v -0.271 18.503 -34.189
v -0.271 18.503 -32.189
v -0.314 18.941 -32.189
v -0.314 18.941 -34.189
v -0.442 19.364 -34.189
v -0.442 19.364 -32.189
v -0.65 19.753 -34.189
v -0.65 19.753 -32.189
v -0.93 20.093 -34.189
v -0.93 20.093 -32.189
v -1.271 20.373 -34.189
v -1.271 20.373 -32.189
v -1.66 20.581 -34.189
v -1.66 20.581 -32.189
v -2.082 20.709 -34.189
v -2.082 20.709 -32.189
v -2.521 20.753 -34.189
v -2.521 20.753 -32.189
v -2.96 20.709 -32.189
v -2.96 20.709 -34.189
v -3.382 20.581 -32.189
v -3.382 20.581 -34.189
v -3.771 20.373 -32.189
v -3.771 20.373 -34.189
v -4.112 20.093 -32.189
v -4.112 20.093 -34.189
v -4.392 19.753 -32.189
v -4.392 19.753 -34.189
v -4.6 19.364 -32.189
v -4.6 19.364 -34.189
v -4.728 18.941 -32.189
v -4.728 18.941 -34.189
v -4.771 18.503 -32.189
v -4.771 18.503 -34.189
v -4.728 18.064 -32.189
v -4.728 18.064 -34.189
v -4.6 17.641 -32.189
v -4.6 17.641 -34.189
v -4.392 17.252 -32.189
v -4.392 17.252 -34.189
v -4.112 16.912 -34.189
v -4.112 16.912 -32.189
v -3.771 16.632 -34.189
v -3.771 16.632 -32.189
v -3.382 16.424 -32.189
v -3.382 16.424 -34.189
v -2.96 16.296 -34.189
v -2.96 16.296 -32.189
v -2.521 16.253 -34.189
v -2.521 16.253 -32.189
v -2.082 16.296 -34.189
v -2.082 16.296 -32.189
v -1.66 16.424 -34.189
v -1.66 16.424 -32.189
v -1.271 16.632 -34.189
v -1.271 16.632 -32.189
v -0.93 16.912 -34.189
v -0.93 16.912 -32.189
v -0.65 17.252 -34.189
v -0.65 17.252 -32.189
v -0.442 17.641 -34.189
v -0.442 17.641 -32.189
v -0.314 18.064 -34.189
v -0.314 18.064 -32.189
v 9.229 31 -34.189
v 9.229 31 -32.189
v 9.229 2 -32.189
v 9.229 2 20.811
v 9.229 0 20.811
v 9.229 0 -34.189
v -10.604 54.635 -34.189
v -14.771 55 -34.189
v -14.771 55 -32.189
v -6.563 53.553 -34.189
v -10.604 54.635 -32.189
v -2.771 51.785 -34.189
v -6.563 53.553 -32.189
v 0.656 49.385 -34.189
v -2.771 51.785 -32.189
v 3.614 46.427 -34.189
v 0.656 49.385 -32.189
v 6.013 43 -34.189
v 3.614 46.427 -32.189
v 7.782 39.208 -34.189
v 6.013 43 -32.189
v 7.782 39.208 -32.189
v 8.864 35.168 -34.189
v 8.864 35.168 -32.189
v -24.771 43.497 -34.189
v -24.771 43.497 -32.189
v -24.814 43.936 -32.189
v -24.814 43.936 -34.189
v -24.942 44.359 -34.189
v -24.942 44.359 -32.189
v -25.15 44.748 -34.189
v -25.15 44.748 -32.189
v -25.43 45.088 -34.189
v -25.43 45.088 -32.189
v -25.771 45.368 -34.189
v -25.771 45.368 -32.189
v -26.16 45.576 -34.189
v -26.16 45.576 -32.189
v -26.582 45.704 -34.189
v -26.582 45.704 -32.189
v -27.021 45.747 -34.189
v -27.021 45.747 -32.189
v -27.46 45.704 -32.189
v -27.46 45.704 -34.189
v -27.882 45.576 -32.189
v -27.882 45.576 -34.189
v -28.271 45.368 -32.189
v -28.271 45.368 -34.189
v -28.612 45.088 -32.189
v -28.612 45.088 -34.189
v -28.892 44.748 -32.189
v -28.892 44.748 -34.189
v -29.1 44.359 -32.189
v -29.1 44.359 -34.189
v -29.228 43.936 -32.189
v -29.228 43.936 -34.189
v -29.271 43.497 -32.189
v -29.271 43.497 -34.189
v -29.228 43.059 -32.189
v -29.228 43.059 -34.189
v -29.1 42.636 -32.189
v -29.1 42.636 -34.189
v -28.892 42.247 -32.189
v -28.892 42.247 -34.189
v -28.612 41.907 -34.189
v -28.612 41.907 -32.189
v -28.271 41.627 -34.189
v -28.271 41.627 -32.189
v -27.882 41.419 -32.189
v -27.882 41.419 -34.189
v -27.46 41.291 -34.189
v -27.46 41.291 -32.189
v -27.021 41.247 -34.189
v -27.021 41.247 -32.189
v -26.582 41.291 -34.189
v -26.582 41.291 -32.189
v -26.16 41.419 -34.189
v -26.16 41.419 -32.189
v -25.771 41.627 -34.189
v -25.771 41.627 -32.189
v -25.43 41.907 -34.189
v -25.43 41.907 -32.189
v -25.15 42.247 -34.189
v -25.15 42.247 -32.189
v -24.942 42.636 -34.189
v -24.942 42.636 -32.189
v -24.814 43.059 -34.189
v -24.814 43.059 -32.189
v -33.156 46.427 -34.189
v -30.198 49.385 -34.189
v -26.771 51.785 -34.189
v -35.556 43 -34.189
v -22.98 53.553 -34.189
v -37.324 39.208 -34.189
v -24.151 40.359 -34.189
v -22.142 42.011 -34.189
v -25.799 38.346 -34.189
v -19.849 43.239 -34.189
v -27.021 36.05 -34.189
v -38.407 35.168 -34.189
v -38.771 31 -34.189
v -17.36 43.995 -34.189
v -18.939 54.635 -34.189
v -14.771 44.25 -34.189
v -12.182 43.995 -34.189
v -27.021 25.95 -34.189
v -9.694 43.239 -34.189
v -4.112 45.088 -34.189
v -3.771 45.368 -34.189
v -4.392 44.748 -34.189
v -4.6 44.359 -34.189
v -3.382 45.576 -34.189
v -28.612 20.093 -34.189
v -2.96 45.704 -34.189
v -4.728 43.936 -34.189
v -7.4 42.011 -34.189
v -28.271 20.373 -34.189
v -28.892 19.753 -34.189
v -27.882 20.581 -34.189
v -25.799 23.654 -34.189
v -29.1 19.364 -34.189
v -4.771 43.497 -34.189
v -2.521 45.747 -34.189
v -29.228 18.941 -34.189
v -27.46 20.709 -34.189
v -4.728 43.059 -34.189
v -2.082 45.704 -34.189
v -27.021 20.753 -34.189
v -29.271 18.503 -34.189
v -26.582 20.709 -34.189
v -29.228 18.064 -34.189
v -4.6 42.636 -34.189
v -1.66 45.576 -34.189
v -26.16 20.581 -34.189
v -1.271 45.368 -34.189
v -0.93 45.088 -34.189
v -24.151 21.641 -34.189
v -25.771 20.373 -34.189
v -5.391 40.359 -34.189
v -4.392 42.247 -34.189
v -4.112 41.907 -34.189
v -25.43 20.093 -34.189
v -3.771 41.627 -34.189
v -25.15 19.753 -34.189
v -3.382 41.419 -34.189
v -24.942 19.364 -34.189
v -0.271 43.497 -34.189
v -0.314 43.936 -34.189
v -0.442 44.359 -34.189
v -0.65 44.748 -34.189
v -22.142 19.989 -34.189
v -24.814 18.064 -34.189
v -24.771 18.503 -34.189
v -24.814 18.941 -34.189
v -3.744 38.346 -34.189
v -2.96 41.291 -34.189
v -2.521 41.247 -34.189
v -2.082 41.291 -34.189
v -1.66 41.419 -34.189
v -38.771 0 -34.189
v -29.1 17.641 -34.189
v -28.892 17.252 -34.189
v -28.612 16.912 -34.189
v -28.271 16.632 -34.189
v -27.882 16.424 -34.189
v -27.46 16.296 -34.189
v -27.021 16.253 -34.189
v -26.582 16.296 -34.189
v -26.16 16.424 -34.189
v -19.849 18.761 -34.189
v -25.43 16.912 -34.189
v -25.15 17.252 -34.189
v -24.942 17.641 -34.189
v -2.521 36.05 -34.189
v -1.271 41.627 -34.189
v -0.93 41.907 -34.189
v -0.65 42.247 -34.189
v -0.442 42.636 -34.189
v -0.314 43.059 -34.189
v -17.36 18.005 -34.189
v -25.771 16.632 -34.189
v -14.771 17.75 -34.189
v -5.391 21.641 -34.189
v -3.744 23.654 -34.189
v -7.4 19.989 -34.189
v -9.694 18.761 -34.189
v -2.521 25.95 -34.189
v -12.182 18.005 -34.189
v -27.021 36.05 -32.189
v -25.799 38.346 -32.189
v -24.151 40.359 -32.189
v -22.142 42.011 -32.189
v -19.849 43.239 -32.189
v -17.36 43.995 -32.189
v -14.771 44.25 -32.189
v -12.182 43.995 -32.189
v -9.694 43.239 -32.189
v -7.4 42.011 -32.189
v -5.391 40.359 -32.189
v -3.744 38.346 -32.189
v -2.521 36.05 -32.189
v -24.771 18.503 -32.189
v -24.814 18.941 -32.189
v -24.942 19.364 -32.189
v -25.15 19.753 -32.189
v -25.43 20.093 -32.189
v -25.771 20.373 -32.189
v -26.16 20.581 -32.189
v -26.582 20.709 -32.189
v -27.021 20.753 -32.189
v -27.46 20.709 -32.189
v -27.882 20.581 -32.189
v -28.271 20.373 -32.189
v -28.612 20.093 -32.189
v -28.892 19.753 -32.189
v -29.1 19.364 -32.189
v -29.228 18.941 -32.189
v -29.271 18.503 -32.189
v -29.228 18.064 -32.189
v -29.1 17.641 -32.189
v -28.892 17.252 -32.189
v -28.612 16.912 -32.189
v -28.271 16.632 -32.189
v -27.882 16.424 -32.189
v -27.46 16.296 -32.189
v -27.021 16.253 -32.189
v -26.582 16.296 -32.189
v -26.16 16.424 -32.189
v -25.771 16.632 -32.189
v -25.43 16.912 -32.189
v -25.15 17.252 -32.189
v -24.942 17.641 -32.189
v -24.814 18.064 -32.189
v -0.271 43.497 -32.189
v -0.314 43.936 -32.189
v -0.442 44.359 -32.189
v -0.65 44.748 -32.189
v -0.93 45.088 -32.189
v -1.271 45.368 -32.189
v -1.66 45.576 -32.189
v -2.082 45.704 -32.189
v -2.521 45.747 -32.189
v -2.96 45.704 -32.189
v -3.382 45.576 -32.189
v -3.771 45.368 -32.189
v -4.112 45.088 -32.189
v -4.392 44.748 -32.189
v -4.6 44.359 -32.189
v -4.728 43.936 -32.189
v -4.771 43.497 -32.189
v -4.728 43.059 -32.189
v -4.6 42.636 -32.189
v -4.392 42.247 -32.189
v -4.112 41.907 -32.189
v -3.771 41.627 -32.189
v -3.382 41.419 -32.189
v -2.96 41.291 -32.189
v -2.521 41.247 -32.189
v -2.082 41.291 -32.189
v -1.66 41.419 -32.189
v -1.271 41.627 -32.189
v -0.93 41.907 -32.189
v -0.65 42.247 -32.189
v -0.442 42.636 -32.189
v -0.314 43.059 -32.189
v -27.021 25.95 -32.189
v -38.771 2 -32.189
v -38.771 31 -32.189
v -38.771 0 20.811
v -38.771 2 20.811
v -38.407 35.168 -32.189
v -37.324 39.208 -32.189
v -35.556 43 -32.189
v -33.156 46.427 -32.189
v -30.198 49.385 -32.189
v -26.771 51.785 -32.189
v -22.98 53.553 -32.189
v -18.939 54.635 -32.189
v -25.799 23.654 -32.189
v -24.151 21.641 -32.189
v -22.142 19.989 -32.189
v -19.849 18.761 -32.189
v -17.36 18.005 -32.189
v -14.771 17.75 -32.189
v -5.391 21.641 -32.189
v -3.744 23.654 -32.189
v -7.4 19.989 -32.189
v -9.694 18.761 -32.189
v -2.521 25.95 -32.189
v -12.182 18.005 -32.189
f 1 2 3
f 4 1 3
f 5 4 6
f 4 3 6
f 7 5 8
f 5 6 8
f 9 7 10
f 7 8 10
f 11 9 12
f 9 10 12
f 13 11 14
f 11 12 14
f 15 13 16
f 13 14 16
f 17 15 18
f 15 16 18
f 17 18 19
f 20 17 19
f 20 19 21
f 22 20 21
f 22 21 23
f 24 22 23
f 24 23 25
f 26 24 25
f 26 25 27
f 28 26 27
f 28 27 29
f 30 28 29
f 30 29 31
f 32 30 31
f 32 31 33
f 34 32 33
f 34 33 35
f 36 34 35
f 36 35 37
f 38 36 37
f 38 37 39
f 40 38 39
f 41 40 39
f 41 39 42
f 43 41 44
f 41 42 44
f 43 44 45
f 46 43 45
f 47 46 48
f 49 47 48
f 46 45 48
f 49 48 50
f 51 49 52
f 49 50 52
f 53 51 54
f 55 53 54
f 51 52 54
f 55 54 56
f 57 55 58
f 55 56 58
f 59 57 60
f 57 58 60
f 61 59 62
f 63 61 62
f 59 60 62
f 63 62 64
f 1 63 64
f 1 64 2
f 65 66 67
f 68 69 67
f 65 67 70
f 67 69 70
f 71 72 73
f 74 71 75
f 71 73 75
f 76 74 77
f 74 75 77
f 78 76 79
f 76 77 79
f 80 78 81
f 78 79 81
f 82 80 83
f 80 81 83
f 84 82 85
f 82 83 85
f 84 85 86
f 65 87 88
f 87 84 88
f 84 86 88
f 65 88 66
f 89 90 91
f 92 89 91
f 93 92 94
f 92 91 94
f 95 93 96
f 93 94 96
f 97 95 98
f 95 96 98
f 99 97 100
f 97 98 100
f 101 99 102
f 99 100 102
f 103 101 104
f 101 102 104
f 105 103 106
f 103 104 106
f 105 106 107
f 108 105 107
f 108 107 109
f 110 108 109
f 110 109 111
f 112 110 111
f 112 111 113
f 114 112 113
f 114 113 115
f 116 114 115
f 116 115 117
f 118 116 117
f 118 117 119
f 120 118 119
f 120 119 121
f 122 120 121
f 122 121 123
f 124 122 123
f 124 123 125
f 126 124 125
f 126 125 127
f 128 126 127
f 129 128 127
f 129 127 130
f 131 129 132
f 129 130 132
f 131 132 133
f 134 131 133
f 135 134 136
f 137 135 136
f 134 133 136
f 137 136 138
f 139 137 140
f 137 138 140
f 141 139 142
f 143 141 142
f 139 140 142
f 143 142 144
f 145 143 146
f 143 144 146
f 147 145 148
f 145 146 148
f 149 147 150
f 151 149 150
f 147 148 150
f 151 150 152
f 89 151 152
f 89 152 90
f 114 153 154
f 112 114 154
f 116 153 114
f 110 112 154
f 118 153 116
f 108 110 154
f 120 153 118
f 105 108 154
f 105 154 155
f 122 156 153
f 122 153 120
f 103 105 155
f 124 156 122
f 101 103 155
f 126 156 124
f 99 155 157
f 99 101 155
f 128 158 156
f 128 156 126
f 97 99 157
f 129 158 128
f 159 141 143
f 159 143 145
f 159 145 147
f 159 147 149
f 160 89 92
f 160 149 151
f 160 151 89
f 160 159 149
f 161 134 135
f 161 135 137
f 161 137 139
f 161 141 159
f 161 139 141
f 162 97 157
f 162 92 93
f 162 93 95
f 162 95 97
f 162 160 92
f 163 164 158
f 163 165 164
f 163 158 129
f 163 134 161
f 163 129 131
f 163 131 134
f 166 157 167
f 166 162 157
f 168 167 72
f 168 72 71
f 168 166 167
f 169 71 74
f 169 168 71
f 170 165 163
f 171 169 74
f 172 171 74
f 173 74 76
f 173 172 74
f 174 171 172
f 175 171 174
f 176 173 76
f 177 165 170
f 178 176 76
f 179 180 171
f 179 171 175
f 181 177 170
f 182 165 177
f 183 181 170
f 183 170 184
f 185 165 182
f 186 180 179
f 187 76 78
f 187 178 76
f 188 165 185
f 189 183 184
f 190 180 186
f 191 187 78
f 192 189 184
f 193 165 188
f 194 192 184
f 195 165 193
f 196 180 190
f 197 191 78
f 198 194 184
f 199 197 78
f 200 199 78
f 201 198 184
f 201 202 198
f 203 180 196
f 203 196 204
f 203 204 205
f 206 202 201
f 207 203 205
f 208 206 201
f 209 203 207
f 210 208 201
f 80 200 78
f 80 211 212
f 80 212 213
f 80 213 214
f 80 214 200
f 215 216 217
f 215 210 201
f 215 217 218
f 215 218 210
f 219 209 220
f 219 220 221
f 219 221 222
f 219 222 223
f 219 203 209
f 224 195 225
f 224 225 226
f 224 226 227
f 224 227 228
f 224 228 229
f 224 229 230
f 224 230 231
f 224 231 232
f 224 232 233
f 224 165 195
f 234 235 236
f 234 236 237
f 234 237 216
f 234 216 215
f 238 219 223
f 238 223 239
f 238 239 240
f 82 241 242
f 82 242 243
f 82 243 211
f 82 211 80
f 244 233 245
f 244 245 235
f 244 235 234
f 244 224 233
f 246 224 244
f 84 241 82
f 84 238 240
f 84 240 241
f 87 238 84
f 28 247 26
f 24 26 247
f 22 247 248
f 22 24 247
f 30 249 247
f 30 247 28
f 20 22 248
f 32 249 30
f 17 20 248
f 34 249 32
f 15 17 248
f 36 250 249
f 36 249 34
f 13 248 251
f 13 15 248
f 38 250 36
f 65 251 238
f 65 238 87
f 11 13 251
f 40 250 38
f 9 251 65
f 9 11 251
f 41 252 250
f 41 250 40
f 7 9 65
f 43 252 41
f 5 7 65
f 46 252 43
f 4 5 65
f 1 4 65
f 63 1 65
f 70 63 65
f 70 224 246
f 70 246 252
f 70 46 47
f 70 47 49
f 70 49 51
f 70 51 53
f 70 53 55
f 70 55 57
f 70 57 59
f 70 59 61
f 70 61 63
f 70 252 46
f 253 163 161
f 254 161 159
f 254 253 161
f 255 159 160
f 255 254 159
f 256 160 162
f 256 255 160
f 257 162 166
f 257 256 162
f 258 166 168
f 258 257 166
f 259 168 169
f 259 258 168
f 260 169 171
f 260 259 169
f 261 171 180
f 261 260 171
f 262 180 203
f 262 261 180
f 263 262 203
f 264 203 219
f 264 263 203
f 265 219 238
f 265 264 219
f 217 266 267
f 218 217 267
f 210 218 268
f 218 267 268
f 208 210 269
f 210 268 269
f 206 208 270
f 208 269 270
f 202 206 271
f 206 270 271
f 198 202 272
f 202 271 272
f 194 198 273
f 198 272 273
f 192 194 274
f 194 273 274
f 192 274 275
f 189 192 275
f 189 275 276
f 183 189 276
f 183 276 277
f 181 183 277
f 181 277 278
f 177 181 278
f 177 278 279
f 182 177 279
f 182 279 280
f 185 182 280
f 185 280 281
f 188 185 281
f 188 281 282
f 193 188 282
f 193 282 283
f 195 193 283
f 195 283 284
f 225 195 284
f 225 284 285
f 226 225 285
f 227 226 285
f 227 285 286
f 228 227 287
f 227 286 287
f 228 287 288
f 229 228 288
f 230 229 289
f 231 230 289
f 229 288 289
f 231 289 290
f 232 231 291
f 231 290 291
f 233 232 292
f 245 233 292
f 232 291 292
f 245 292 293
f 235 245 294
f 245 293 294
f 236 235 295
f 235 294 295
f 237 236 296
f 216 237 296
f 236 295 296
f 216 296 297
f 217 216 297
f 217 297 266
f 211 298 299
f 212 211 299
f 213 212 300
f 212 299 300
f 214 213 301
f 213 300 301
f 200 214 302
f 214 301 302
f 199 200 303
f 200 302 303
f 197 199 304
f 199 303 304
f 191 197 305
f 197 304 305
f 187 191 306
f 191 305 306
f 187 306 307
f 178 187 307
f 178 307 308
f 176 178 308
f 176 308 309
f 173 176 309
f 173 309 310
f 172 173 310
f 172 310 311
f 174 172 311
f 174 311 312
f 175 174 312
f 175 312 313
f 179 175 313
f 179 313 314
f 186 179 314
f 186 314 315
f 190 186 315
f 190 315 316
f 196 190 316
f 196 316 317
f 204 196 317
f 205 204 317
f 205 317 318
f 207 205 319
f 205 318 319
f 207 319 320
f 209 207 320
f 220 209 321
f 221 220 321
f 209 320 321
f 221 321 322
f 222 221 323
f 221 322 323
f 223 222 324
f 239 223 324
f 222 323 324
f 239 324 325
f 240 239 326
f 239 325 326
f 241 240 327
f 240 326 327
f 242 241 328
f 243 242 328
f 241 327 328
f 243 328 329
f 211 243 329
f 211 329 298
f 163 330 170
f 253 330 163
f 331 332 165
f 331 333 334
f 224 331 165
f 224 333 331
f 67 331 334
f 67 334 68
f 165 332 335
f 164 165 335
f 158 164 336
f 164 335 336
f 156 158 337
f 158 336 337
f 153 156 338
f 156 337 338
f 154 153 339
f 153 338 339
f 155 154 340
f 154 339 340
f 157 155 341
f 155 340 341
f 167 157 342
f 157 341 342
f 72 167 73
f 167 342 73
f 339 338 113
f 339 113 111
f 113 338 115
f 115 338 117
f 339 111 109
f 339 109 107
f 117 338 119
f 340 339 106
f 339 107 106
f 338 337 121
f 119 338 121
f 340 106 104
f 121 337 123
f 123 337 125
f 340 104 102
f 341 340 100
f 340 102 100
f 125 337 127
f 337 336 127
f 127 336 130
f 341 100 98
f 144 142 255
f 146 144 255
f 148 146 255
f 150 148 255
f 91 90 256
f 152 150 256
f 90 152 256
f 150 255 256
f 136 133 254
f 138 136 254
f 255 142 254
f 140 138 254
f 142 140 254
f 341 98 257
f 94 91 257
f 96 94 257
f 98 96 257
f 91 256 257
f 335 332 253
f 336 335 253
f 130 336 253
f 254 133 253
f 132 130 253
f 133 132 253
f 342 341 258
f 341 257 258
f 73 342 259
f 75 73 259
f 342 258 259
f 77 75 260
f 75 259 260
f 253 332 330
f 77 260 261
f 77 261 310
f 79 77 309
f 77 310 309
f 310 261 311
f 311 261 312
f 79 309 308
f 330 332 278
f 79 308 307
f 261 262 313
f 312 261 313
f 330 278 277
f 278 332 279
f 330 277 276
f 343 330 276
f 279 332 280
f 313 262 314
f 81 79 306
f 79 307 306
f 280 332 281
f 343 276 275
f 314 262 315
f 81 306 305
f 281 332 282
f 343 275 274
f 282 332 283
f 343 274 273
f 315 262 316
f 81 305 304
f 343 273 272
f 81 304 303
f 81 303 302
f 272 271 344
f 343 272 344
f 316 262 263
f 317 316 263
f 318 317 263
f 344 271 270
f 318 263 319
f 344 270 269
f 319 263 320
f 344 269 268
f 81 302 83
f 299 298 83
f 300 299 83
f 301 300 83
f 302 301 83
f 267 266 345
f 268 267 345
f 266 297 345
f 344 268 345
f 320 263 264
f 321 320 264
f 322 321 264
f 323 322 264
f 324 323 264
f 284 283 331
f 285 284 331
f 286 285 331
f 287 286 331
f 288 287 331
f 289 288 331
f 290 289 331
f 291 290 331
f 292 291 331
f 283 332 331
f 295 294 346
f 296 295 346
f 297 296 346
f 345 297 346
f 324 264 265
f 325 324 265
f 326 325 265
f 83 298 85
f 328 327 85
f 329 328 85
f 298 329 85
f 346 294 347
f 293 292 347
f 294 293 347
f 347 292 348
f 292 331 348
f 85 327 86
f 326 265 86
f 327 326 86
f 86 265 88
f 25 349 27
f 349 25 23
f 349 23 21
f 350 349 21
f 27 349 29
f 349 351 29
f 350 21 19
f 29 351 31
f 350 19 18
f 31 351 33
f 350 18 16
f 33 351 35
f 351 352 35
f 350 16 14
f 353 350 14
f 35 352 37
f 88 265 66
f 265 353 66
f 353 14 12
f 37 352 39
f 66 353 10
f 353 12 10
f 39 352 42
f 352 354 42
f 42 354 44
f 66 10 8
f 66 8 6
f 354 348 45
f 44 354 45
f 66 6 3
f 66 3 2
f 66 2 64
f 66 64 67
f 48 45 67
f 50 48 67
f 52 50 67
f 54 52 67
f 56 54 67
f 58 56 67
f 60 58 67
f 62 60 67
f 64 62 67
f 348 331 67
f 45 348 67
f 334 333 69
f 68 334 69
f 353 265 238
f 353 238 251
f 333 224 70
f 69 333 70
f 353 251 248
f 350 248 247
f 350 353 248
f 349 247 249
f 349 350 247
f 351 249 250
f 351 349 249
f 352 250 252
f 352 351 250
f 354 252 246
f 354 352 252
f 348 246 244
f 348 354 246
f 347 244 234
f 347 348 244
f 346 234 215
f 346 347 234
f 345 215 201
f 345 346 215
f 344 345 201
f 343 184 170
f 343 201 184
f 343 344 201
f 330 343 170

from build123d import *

# Parameters (mm, degrees)
SKETCH1_W           = 48
SKETCH1_H           = 55
BOSS_EXTRUDE1_DEPTH = 2
SKETCH2_W           = 48
SKETCH2_H           = 2
BOSS_EXTRUDE2_DEPTH = 53
CUT_EXTRUDE1_DEPTH  = 53
CUT_EXTRUDE2_DEPTH  = 53
SKETCH5_R           = 2.25
CUT_EXTRUDE3_DEPTH  = 53


with BuildPart() as part:
    # Sketch1 → Boss-Extrude1 (new body)
    with BuildSketch(Plane(origin=(0, 0, 0), x_dir=(1, 0, 0), z_dir=(0, 1, 0))):
        with Locations((-14.771122877, 6.689300827)):
            Rectangle(SKETCH1_W, SKETCH1_H)
    extrude(amount=BOSS_EXTRUDE1_DEPTH)

    # Sketch2 → Boss-Extrude2 (add)
    with BuildSketch(Plane(origin=(0, 2, 0), x_dir=(1, 0, 0), z_dir=(0, 1, 0))):
        with Locations((-14.771122877, 33.189300827)):
            Rectangle(SKETCH2_W, SKETCH2_H)
    extrude(amount=BOSS_EXTRUDE2_DEPTH)

    # Sketch3 → Cut-Extrude1 (cut)
    with BuildSketch(Plane.XY.offset(-32.189300827)):
        with BuildLine():
            Line((-14.771122877, 55), (-38.771122877, 55))
            Line((-38.771122877, 55), (-38.771122877, 31))
            ThreePointArc((-38.771122877, 31), (-31.741685625, 47.970562748), (-14.771122877, 55))
        make_face()
        with BuildLine():
            Line((9.228877123, 55), (-14.771122877, 55))
            ThreePointArc((-14.771122877, 55), (2.199439872, 47.970562748), (9.228877123, 31))
            Line((9.228877123, 31), (9.228877123, 55))
        make_face()
    extrude(amount=-CUT_EXTRUDE1_DEPTH, mode=Mode.SUBTRACT)

    # Sketch4 → Cut-Extrude2 (cut)
    with BuildSketch(Plane.XY.offset(-32.189300827)):
        with BuildLine():
            Line((-27.021122877, 25.950247531), (-27.021122877, 36.049752469))
            ThreePointArc((-27.021122877, 36.049752469), (-14.771122877, 44.25), (-2.521122877, 36.049752469))
            Line((-2.521122877, 36.049752469), (-2.521122877, 25.950247531))
            ThreePointArc((-2.521122877, 25.950247531), (-14.771122877, 17.75), (-27.021122877, 25.950247531))
        make_face()
    extrude(amount=-CUT_EXTRUDE2_DEPTH, mode=Mode.SUBTRACT)

    # Sketch5 → Cut-Extrude3 (cut)
    with BuildSketch(Plane.XY.offset(-32.189300827)):
        with Locations((-27.021122877, 43.49749975)):
            Circle(SKETCH5_R)
        with Locations((-2.521122877, 43.49749975)):
            Circle(SKETCH5_R)
        with Locations((-27.021122877, 18.50250025)):
            Circle(SKETCH5_R)
        with Locations((-2.521122877, 18.50250025)):
            Circle(SKETCH5_R)
    extrude(amount=-CUT_EXTRUDE3_DEPTH, mode=Mode.SUBTRACT)


solid = part.part
